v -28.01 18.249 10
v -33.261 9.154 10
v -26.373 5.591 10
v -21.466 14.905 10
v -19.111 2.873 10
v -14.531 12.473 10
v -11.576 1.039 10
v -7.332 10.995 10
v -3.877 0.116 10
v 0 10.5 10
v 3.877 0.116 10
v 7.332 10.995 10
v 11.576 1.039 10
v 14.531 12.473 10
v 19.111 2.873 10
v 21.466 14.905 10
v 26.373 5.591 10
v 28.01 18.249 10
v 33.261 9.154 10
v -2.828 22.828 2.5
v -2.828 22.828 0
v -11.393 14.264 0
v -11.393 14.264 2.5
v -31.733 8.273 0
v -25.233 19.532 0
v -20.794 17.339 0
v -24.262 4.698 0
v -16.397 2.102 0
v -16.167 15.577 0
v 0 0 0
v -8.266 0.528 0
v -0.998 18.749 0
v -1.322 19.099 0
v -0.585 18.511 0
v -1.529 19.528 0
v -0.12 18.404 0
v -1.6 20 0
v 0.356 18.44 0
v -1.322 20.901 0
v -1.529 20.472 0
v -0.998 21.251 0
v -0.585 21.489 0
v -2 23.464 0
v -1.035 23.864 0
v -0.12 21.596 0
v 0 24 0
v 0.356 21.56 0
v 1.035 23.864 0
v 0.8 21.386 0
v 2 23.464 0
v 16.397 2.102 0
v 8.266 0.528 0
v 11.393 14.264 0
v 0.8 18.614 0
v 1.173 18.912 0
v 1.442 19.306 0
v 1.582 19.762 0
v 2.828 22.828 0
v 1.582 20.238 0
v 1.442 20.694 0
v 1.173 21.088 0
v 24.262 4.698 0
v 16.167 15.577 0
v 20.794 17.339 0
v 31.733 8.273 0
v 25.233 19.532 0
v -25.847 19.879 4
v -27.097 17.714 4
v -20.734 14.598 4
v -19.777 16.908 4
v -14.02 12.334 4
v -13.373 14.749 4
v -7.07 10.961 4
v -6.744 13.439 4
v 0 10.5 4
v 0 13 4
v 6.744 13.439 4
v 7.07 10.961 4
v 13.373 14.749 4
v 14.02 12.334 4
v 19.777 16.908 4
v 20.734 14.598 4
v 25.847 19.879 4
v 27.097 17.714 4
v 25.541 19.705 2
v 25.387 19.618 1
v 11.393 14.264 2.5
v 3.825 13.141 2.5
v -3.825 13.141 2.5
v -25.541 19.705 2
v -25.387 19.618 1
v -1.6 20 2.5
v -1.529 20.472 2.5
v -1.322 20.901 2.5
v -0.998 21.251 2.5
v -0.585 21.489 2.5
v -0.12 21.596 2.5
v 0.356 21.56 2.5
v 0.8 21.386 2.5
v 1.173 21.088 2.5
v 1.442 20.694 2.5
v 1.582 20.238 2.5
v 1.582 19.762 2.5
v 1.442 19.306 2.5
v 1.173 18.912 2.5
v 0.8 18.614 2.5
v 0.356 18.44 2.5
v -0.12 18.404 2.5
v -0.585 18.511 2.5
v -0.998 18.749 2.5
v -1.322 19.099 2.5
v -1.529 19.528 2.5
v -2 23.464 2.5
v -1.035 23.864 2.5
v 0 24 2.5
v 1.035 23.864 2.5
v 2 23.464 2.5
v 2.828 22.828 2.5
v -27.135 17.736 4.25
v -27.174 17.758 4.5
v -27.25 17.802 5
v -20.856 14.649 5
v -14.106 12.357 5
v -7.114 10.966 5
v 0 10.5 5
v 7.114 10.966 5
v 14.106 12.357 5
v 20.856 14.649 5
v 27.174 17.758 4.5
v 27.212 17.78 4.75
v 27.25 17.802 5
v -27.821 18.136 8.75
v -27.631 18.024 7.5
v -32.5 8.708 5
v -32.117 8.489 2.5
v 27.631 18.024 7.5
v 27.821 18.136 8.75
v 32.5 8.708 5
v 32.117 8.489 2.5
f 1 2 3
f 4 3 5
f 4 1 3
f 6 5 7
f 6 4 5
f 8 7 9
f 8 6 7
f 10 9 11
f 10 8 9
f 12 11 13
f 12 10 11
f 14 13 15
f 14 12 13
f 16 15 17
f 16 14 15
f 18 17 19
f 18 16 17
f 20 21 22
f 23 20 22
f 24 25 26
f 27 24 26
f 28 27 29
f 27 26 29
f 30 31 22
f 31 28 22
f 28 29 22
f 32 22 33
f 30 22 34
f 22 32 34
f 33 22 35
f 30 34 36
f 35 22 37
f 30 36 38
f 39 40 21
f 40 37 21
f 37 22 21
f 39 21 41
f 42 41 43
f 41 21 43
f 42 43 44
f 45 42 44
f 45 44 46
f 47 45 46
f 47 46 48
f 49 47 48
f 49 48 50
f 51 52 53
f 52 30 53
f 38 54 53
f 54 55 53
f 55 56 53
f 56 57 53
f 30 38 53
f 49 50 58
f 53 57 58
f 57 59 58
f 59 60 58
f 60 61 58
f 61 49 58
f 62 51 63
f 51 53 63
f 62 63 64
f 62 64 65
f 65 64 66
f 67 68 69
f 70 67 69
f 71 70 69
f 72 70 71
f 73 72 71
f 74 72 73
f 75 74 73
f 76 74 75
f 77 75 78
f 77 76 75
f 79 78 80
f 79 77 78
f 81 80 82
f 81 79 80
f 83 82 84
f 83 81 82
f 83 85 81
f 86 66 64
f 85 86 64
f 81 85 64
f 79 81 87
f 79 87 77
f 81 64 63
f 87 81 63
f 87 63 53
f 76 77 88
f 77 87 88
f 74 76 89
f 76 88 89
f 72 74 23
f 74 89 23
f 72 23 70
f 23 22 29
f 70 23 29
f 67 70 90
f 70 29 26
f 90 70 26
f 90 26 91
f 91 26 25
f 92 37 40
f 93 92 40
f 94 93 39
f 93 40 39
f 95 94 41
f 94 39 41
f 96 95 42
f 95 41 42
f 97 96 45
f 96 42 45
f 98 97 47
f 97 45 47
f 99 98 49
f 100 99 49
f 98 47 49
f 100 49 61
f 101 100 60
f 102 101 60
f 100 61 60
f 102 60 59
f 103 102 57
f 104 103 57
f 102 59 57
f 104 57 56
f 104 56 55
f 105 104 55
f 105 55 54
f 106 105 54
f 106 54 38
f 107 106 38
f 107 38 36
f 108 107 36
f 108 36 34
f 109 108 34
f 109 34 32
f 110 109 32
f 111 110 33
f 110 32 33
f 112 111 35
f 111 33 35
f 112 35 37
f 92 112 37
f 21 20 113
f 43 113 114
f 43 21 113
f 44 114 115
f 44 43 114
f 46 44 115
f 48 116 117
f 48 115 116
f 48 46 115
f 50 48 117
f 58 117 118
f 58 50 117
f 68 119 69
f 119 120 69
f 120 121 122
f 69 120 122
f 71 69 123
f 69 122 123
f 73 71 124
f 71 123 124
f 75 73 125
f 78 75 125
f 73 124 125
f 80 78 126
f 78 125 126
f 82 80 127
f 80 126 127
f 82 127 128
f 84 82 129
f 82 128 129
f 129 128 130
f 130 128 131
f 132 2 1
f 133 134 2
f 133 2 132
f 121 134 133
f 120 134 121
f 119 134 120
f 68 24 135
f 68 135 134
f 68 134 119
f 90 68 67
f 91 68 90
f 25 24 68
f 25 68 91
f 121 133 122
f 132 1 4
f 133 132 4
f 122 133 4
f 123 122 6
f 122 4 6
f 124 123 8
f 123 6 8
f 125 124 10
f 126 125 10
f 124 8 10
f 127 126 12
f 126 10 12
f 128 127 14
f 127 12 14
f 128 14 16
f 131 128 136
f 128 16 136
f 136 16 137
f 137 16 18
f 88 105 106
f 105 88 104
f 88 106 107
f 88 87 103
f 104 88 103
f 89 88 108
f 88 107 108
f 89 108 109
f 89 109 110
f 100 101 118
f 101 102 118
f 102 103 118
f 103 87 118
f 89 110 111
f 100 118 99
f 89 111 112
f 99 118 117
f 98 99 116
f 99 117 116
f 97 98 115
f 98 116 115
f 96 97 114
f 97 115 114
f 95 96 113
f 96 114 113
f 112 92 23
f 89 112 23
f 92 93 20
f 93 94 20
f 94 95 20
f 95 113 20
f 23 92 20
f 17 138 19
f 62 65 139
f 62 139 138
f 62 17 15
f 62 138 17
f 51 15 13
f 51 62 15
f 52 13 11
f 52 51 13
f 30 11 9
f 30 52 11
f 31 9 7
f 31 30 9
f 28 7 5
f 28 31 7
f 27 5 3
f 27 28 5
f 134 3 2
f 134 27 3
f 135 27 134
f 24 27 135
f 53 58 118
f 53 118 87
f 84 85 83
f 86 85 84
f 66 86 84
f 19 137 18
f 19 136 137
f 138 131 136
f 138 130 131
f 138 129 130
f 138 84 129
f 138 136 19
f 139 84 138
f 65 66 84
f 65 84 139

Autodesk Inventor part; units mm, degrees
ref_plane "YZ Plane" through (0, 0, 0) normal (1, 0, 0) x (0, 1, 0)
ref_plane "XZ Plane" through (0, 0, 0) normal (0, 1, 0) x (-1, 0, 0)
ref_plane "XY Plane" through (0, 0, 0) normal (0, 0, 1) x (1, 0, 0)
sketch "Эскиз1" plane through (0, 0, 0) normal (0, 0, 1) x (1, 0, 0)
  line L0 (-19.4221, 3.2482) -> (-17.0252, 13.9839) projected
  line L1 (17.0252, 13.9839) -> (19.4221, 3.2482) projected
  arc A0 (-41.5809, 15.0397) -> (41.5809, 15.0397) centre (0, 65) ccw projected
  line L2 (41.5809, 15.0397) -> (33.2647, 25.0318) projected
  arc A1 (-33.2647, 25.0318) -> (33.2647, 25.0318) centre (0, 65) ccw projected
  line L3 (-33.2647, 25.0318) -> (-41.5809, 15.0397) projected
  line L4 (-5.5, 11.5) -> (-5.5, 0.5) projected
  line L5 (5.5, 0.5) -> (5.5, 11.5) projected
  circle A2 centre (0, 65) radius 65
  circle A3 centre (0, 65) radius 52
  line L6 (-41.5809, 15.0397) -> (-33.2647, 25.0318)
  line L7 (20.5764, 3.3428) -> (0, 65)
  line L8 (-41.5809, 15.0397) -> (0, 65)
  line L9 (0, 65) -> (21.1137, 3.5247)
  line L10 (-32.5, 8.7083) -> (0, 65)
  line L11 (0, 65) -> (32.5, 8.7083)
  line L12 (0, 65) -> (0, 0)
  arc A4 (-39.7976, 13.9446) -> (-45.7382, 14.0977) centre (-42.8715, 10.0011) ccw projected
  line L13 (-45.7382, 14.0977) -> (-66.813, -0.6503) projected
  line L14 (-66.813, -0.6503) -> (-66.8135, -2.4814) projected
  line L15 (-66.8135, -2.4814) -> (-61.8135, -2.4828) projected
  line L16 (-61.8135, -2.4828) -> (-61.8127, 0.4976) projected
  arc A5 (-61.386, 1.3167) -> (-61.8127, 0.4976) centre (-60.8127, 0.4974) ccw projected
  line L17 (-61.386, 1.3167) -> (-46.2094, 11.9372) projected
  arc A6 (-40.3216, 11.8247) -> (-46.2094, 11.9372) centre (-43.3426, 7.8406) ccw projected
  arc A7 (-40.3216, 11.8247) -> (-21.0718, 1.6801) centre (0, 65) ccw projected
  line L18 (-21.0718, 1.6801) -> (-20.6332, 3.6423) projected
  arc A8 (-39.7976, 13.9446) -> (-20.6332, 3.6423) centre (0, 65) ccw projected
  circle A9 centre (0, 65) radius 64.7341
  arc A10 (-42.6225, 16.2781) -> (-20.6332, 3.6423) centre (0, 65) ccw projected
  line L19 (-42.6225, 16.2781) -> (0, 65)
  point P0 (0, 0)
  point P1 (0, 13)
  point P2 (-26, 19.9667)
  point P3 (-32.5, 8.7083)
  point P4 (32.5, 8.7083)
  point P5 (26, 19.9667)
  dimension "d23" = 0.5
  dimension "d25" = 60
  dimension "d26" = 30
  dimension "d42" = 60.135
extrude "Выдавливание1" add sketch "Эскиз1" along normal blind 10 contours L7 A9 L1 | L7 A1 L9 A9 | L1 A9 L12 A1 L7 | A9 L7 A0 L12 | A9 L9 A0 L7 | A9 L11 A0 L9 | L9 A1 L11 A9 | L12 A9 A8 L10 A1 | L12 A0 L18 A9 | A0 L10 A8 L18
sketch "Эскиз4" plane through (0, 0, 10) normal (0, 0, 1) x (1, 0, 0)
  arc A0 (-13.3607, 13.1952) -> (-9.9415, 12.4318) centre (0, 65) ccw projected
  circle A1 centre (0, 65) radius 53.5
  circle A2 centre (0, 65) radius 54.5
  line L0 (-26, 19.9667) -> (-32.5, 8.7083) projected
  arc A3 (-26, 19.9667) -> (-22.4589, 18.1001) centre (0, 65) ccw projected
  arc A4 (-26, 19.9667) -> (26, 19.9667) centre (0, 65) ccw projected
  arc A5 (22.4589, 18.1001) -> (26, 19.9667) centre (0, 65) ccw projected
  line L1 (32.5, 8.7083) -> (26, 19.9667) projected
  point P0 (0, 0)
  point P1 (-27.25, 17.8016)
  point P2 (27.25, 17.8016)
  dimension "d43" = 1
extrude "Выдавливание4" cut sketch "Эскиз4" against normal blind 5 contours A1 L0 A3 A4 L1 A0 | A0 A1 L1 A2 L0
draft "НаклГрань1" angle 10 pull direction (0, 0, -1) faces at (-30.75, 11.7394, 5) fixed edges at (-26.625, 18.8841, 5)
draft "НаклГрань2" angle 10 pull direction (0, 0, -1) faces at (30.75, 11.7394, 5) fixed edges at (26.625, 18.8841, 5)
sketch "Эскиз5" plane through (0, 0, 10) normal (0, 0, 1) x (1, 0, 0)
  arc A0 (-26, 19.9667) -> (26, 19.9667) centre (0, 65) ccw projected
  line L0 (-27.25, 17.8016) -> (-26, 19.9667) projected
  arc A1 (-27.25, 17.8016) -> (27.25, 17.8016) centre (0, 65) ccw projected
  line L1 (26, 19.9667) -> (27.25, 17.8016) projected
  point P0 (0, 0)
extrude "Выдавливание5" cut sketch "Эскиз5" against normal blind 6
sketch "Эскиз6" plane through (0, 0, 0) normal (0, 0, -1) x (-1, 0, 0)
  line L0 (-31.7335, 8.2727) -> (-25.2327, 19.5323) projected
  arc A0 (-25.2327, 19.5323) -> (25.2327, 19.5323) centre (0, 65) ccw projected
  arc A1 (-31.7335, 8.2727) -> (31.7335, 8.2727) centre (0, 65) ccw projected
  line L1 (25.2327, 19.5323) -> (31.7335, 8.2727) projected
  circle A2 centre (0, 20) radius 1.925 projected
  circle A3 centre (0, 20) radius 4 projected
  circle A4 centre (0, 20) radius 1.6
  circle A5 centre (0, 20) radius 4
  line L2 (-2.8284, 22.8284) -> (-11.3933, 14.2635)
  line L3 (2.8284, 22.8284) -> (11.3933, 14.2635)
  line L4 (0, 89.6007) -> (0, 9.3033) projected
  point P0 (0, 0)
  dimension "d50" = 3.2
  dimension "d51" = 8
  dimension "d52" = 45
  dimension "d53" = 45
extrude "Выдавливание6" add sketch "Эскиз6" against normal blind 2.5 contours L2 A3 L4 A0 | L4 A3 L3 A0 | A3 L4 A2 | L4 A2 A3 | L4 A4 A2 | A2 L4 A4
equation "\"d26\" = 0.5 * d25"
properties part number "vzuh_karetka"
